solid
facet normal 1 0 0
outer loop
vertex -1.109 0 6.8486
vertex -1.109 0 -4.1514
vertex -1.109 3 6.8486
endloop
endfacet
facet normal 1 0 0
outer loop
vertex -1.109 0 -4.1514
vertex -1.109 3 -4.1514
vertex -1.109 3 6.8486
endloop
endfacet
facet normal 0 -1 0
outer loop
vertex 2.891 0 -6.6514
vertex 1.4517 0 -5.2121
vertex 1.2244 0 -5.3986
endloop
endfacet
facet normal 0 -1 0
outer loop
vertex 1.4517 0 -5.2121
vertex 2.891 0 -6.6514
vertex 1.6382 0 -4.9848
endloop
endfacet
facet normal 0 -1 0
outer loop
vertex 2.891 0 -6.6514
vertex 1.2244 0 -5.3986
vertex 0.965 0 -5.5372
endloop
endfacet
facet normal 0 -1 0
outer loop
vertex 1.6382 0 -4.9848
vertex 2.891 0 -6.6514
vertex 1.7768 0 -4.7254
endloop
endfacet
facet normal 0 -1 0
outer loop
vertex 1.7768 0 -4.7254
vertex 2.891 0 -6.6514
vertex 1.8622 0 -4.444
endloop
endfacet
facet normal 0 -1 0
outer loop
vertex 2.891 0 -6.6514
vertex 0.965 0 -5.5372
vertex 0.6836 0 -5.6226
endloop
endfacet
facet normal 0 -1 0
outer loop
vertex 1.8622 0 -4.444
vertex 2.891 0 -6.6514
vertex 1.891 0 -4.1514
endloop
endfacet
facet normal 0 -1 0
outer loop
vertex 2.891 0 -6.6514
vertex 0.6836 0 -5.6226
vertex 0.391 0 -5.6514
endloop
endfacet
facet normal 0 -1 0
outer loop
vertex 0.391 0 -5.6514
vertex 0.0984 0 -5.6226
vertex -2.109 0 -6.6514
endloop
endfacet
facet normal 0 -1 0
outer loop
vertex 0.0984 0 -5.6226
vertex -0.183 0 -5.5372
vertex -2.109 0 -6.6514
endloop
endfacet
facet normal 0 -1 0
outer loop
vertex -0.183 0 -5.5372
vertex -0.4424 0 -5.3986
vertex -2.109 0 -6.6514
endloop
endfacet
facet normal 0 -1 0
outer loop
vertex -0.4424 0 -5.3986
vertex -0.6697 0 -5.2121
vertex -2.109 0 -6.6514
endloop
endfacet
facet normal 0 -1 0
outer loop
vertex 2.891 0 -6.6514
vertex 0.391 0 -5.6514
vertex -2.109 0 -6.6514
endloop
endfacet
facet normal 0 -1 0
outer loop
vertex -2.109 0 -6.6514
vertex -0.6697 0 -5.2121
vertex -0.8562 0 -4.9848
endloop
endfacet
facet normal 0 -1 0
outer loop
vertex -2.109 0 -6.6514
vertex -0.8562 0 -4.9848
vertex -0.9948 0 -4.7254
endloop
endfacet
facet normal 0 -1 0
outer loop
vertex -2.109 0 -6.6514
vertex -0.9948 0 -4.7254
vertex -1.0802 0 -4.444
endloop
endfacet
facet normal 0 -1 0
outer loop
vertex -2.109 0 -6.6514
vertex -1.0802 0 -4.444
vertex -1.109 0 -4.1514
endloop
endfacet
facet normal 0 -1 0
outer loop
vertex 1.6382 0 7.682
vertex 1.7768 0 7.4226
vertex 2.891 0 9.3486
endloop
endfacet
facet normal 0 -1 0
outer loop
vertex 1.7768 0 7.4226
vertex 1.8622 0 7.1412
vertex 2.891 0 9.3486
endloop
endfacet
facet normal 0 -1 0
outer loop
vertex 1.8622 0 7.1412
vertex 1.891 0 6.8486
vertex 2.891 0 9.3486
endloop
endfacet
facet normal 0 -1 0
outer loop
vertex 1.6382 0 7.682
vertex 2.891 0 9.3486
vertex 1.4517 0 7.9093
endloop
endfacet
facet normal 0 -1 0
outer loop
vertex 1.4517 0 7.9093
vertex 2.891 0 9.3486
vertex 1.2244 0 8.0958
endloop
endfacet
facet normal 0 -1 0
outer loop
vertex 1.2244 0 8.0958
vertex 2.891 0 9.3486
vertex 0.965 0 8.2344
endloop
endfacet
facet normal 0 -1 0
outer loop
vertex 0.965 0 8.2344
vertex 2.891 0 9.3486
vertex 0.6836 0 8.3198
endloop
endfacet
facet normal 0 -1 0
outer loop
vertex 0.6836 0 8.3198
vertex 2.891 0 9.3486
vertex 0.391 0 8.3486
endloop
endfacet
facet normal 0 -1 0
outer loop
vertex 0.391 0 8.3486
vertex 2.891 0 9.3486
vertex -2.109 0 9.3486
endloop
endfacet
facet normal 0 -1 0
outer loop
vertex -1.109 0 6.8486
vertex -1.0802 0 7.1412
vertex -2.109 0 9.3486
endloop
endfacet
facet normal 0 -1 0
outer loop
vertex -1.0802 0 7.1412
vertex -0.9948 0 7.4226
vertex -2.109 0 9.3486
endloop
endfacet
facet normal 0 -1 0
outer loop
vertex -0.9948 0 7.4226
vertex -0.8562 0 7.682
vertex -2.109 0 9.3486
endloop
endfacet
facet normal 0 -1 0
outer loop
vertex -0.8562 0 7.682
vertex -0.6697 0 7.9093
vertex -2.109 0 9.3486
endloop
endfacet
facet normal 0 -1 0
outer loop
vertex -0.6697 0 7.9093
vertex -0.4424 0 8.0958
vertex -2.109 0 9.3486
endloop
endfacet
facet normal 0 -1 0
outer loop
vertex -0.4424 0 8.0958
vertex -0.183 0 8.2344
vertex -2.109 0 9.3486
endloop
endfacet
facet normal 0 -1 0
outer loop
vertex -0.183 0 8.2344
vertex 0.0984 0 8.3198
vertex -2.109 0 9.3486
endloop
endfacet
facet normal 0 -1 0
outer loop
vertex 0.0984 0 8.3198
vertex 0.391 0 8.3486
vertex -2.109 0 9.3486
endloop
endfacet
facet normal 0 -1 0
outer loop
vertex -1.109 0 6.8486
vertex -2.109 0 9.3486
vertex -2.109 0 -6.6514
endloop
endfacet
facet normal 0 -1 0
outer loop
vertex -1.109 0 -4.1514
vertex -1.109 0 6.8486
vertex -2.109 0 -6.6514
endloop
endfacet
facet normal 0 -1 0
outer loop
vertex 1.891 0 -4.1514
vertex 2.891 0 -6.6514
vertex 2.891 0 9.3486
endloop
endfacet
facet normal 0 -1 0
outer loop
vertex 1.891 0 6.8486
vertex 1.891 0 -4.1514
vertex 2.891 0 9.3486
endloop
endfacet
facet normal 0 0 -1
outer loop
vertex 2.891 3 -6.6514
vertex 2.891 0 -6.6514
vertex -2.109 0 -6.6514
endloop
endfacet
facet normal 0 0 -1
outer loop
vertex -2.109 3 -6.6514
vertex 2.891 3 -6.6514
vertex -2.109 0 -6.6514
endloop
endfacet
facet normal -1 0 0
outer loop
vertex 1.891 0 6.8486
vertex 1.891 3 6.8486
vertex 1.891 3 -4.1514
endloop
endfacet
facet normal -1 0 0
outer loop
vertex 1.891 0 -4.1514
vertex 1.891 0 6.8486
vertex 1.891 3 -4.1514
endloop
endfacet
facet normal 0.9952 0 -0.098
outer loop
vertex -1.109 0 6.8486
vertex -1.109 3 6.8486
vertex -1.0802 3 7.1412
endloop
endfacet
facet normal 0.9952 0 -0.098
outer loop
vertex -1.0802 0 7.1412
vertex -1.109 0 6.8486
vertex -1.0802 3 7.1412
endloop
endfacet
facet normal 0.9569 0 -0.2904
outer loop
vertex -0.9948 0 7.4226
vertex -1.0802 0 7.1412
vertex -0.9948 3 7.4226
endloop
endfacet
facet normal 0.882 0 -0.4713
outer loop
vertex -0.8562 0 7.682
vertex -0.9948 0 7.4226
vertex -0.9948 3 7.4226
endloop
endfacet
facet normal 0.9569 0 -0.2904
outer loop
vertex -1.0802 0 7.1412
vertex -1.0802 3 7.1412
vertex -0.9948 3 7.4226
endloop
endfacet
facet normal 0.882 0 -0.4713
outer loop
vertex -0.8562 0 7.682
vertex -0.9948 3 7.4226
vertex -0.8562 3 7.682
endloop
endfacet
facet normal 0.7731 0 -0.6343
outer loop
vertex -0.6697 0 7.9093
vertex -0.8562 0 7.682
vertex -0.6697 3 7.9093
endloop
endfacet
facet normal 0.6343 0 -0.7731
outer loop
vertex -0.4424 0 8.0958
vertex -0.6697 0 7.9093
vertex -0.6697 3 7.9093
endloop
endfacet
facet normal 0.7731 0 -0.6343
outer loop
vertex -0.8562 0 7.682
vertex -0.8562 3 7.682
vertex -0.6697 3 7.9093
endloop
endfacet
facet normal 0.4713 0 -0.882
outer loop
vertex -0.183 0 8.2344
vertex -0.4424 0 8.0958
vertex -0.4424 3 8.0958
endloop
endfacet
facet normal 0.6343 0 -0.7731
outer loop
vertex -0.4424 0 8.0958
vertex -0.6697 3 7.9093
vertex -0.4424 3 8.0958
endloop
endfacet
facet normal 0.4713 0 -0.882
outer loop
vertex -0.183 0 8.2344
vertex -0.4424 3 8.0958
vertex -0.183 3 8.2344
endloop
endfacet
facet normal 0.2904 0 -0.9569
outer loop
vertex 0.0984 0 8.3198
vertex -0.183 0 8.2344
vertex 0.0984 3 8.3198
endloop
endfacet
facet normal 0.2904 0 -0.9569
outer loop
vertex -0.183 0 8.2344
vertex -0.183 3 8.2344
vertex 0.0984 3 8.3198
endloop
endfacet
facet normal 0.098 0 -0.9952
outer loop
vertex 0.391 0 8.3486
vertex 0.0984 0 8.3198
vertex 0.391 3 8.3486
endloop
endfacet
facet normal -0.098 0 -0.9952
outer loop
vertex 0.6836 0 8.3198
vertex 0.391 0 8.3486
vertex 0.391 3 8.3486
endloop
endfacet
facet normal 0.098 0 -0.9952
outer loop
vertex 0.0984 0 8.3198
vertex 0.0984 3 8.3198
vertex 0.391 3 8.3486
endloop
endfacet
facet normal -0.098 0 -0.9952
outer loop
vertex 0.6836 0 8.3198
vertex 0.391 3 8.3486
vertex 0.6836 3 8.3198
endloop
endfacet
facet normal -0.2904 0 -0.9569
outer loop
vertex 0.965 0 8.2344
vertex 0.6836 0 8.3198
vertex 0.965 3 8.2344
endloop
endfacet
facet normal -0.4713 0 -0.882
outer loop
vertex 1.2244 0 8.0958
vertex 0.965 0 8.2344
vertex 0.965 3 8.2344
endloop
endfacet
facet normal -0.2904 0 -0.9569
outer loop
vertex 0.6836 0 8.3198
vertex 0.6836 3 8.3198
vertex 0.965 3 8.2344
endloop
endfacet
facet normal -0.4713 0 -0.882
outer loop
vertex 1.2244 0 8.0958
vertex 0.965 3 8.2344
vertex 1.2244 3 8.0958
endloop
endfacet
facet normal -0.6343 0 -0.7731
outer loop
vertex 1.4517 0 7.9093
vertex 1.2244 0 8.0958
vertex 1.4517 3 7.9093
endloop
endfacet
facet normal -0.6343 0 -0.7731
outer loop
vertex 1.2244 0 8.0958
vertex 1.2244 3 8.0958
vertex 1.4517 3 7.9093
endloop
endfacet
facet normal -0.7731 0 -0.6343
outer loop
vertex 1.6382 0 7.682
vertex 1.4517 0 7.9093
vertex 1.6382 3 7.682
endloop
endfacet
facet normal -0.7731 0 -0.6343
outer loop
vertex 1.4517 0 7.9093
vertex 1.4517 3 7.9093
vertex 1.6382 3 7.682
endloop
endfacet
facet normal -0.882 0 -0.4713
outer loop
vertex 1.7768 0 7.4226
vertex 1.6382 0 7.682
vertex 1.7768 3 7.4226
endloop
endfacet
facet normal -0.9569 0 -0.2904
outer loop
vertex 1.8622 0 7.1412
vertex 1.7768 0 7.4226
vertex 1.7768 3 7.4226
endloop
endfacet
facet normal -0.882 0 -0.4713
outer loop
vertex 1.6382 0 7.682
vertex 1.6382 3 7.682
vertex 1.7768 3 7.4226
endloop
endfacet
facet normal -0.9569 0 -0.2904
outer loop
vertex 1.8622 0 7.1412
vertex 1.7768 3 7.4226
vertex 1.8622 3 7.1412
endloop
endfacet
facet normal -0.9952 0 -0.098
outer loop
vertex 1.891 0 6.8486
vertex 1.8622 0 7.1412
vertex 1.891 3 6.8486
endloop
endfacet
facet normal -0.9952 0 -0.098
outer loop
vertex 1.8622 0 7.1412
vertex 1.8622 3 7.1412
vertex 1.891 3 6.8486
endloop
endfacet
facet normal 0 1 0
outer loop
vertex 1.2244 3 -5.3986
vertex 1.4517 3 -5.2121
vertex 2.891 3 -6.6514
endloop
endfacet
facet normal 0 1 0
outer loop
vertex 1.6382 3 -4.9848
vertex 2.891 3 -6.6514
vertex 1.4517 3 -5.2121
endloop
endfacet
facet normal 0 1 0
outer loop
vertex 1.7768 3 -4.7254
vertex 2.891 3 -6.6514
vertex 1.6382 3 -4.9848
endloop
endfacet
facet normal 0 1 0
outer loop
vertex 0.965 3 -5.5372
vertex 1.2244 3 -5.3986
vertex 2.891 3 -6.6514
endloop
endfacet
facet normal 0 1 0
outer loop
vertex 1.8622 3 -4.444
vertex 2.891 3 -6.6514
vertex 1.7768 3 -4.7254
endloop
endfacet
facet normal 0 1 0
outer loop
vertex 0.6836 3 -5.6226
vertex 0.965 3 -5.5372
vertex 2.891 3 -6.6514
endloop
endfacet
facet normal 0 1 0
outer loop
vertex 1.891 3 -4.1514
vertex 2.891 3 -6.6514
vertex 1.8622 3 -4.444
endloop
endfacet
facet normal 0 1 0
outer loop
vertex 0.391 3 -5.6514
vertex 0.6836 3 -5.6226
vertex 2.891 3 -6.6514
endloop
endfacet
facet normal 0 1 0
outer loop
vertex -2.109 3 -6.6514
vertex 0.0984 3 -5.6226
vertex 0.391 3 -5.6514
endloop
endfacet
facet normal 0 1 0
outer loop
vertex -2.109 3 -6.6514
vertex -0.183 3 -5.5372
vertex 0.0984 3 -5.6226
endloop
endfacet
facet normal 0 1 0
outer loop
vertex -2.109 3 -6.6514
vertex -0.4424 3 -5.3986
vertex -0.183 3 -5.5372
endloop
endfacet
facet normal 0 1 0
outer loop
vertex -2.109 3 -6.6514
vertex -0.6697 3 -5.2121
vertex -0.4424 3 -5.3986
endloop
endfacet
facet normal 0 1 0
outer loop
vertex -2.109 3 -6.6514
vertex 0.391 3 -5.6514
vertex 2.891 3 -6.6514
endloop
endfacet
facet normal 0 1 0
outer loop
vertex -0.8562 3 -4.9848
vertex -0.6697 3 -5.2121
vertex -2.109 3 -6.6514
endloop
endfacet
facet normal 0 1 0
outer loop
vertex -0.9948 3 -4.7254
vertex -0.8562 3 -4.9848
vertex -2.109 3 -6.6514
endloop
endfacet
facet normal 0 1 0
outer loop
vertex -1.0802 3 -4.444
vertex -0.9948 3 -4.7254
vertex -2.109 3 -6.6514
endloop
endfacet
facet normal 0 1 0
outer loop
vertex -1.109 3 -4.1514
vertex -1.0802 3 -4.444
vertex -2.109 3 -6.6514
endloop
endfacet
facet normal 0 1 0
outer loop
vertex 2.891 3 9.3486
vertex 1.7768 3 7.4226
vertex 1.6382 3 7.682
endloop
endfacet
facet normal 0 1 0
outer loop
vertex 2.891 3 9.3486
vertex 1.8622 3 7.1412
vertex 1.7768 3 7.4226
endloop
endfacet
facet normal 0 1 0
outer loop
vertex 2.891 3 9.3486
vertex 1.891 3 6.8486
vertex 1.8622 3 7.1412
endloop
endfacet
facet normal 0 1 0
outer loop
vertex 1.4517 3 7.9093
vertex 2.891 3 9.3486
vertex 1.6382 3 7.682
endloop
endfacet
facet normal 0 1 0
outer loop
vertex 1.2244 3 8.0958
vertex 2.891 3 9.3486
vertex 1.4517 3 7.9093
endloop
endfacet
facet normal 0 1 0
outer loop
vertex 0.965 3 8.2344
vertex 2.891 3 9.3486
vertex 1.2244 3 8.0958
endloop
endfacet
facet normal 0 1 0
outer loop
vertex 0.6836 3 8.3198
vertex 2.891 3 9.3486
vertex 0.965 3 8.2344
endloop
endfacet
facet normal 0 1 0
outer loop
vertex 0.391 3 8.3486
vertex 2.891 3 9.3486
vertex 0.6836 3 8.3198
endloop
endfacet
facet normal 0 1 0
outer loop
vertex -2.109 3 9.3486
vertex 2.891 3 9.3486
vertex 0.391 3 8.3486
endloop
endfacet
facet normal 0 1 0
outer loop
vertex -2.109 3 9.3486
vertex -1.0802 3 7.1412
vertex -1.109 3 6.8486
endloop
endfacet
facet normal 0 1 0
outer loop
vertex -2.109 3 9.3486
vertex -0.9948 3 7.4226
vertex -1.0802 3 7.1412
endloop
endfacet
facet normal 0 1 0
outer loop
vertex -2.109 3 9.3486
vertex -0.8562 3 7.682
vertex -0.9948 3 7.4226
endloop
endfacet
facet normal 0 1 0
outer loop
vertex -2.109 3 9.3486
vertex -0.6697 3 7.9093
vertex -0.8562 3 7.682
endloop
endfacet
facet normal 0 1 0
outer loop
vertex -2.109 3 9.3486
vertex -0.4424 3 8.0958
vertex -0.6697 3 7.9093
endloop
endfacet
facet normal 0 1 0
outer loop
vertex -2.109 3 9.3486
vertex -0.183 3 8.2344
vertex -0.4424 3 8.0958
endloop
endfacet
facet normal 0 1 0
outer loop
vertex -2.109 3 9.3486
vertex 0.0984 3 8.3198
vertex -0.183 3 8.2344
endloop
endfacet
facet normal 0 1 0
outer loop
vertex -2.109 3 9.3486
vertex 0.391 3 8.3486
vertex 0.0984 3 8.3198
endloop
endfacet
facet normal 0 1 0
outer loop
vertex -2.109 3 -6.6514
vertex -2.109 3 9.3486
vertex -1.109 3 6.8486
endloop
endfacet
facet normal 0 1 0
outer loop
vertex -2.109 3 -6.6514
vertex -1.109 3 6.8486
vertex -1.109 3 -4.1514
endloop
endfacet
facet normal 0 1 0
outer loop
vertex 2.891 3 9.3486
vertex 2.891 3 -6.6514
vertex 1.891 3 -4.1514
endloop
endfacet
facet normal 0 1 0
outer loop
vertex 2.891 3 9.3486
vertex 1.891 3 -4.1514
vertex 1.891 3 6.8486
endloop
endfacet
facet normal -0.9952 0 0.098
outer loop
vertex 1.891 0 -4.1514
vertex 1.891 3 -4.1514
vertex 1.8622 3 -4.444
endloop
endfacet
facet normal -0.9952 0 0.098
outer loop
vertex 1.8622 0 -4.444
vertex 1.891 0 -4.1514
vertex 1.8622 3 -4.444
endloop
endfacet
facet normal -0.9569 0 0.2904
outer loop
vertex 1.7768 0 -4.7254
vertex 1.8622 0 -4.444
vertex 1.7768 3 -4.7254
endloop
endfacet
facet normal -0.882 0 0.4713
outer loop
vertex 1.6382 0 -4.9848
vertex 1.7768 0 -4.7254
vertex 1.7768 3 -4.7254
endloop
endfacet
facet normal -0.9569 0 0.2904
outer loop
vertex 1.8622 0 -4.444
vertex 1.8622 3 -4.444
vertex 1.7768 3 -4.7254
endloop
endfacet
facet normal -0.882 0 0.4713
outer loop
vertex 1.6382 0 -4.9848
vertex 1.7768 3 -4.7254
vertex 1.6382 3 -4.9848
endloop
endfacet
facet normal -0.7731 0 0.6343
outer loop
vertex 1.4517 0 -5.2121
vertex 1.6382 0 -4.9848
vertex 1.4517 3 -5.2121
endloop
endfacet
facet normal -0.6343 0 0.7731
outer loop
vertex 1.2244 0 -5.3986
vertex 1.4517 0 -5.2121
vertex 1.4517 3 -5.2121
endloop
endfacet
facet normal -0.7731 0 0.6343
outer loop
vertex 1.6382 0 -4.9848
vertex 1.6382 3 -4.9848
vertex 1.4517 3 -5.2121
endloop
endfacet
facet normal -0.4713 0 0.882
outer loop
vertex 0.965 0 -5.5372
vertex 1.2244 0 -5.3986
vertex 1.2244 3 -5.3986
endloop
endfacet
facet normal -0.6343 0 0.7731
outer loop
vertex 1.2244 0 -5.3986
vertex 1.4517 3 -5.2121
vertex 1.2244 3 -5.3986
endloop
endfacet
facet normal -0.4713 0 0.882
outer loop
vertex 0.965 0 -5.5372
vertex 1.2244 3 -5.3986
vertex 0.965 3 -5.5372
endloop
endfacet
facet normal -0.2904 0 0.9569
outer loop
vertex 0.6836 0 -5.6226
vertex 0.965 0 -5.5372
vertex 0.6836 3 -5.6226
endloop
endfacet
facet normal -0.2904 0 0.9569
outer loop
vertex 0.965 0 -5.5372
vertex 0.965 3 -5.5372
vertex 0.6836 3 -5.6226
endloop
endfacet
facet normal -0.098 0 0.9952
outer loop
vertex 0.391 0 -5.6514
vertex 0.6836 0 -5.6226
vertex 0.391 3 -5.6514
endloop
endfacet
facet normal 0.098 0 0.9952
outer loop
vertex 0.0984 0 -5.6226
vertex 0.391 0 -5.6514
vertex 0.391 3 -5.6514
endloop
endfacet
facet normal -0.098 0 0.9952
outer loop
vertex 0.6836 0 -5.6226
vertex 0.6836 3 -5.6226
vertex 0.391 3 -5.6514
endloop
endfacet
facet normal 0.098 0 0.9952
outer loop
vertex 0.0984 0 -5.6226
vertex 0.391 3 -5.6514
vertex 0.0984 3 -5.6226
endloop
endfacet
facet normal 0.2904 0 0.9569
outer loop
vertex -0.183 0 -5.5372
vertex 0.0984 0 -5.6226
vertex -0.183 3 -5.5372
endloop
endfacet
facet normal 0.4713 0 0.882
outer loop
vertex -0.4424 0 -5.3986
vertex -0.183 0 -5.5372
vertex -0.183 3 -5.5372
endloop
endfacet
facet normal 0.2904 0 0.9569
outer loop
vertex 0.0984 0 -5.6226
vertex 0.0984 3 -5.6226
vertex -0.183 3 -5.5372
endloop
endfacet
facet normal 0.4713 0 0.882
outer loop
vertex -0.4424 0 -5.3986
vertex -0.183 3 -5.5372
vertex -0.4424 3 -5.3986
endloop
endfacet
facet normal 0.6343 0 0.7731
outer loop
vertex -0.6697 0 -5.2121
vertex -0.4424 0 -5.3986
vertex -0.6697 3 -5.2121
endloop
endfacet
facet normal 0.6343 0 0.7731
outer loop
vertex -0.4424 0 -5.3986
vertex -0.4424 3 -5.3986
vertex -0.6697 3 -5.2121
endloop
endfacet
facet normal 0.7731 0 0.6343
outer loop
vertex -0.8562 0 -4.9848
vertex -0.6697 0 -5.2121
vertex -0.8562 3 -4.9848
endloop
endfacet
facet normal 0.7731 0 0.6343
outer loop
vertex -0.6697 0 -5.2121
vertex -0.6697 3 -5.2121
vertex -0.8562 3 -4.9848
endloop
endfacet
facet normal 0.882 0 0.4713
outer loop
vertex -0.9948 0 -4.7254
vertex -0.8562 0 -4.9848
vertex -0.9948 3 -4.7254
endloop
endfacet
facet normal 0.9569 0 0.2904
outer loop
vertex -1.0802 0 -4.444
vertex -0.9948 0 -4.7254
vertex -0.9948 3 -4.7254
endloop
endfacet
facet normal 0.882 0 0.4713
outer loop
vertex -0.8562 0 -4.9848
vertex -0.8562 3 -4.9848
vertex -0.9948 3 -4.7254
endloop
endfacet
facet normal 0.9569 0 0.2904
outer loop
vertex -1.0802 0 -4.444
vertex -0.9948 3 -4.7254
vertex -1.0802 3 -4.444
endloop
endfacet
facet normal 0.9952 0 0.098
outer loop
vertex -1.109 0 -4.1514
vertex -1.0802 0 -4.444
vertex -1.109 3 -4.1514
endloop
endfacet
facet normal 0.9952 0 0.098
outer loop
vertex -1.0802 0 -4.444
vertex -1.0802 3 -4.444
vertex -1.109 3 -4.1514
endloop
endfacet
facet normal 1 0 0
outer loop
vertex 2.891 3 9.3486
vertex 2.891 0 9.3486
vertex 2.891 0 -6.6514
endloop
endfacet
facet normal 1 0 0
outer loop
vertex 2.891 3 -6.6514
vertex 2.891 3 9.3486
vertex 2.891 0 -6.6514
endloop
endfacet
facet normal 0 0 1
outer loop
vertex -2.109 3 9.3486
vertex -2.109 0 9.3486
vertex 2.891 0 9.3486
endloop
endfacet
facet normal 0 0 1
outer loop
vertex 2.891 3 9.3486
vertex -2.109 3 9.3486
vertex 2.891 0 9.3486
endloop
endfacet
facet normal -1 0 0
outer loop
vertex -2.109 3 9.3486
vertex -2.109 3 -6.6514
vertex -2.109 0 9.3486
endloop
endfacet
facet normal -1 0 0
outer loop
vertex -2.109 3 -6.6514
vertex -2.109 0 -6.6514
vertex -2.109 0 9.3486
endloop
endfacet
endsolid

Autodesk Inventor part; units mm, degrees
ref_plane "YZ Plane" through (0, 0, 0) normal (1, 0, 0) x (0, 1, 0)
ref_plane "XZ Plane" through (0, 0, 0) normal (0, 1, 0) x (-1, 0, 0)
ref_plane "XY Plane" through (0, 0, 0) normal (0, 0, 1) x (1, 0, 0)
sketch "スケッチ1" plane through (0, 0, 0) normal (0, 0, 1) x (1, 0, 0)
  point P0 (0, 0)
sketch "スケッチ2" plane through (0, 0, 0) normal (0, 1, 0) x (-1, 0, 0)
  line L0 (2.109, 9.3486) -> (-2.891, 9.3486)
  line L1 (-2.891, 9.3486) -> (-2.891, -6.6514)
  line L2 (-2.891, -6.6514) -> (2.109, -6.6514)
  line L3 (2.109, -6.6514) -> (2.109, 9.3486)
  point P0 (0, 0)
  dimension "d0" = 5
  dimension "d1" = 16
extrude "押し出し1" add sketch "スケッチ2" along normal blind 3
sketch "スケッチ3" plane through (0, 3, 0) normal (0, 1, 0) x (1, 0, 0)
  line L0 (0.391, -6.8486) -> (0.391, 4.1514) construction
  line L1 (1.891, -6.8486) -> (1.891, 4.1514)
  line L2 (-1.109, 4.1514) -> (-1.109, -6.8486)
  arc A0 (-1.109, -6.8486) -> (1.891, -6.8486) centre (0.391, -6.8486) ccw
  arc A1 (1.891, 4.1514) -> (-1.109, 4.1514) centre (0.391, 4.1514) ccw
  line L3 (-2.109, 6.6514) -> (-2.109, -9.3486) projected
  line L4 (-2.109, -9.3486) -> (2.891, -9.3486) projected
  point P0 (0, 0)
  point P1 (0.391, -1.3486)
  dimension "d4" = 11
  dimension "d5" = 3
  dimension "d6" = 1
  dimension "d7" = 2.5
extrude "押し出し2" cut sketch "スケッチ3" against normal blind 3
properties part number "creat10"
